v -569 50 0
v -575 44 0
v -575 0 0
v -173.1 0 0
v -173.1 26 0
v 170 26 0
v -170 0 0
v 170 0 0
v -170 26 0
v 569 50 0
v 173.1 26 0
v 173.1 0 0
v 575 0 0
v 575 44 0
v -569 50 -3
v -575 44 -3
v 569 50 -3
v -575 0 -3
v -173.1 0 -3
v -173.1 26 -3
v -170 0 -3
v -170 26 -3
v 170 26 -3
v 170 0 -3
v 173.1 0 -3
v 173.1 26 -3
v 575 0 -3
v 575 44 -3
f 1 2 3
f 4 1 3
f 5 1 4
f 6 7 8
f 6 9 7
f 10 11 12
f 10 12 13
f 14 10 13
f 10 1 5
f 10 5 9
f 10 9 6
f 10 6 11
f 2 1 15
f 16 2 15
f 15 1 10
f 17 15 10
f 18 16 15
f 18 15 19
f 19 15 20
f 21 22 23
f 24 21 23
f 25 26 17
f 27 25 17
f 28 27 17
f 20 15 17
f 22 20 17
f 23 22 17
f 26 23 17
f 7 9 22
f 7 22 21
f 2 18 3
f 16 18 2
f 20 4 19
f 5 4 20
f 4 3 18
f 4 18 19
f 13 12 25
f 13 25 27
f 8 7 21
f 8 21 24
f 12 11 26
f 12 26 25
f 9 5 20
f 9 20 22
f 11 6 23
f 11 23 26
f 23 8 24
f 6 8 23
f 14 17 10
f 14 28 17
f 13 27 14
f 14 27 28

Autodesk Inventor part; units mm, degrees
ref_plane "YZ Plane" through (0, 0, 0) normal (1, 0, 0) x (0, 1, 0)
ref_plane "XZ Plane" through (0, 0, 0) normal (0, 1, 0) x (-1, 0, 0)
ref_plane "XY Plane" through (0, 0, 0) normal (0, 0, 1) x (1, 0, 0)
sketch "Sketch1" plane through (0, 0, 0) normal (0, 0, 1) x (1, 0, 0)
  line L0 (-600, 0) -> (600, 0)
  line L1 (-600, 0) -> (-600, 50)
  line L2 (-600, 50) -> (600, 50)
  line L3 (600, 50) -> (600, 0)
  circle A0 centre (-600, 0) radius 25
  circle A1 centre (600, 0) radius 25
  line L4 (600, 0) -> (644.2345, 16.1001)
  line L5 (644.2345, 16.1001) -> (635, 50)
  line L6 (635, 50) -> (600, 50)
  point P0 (0, 0)
  point P1 (0, 0)
  point P2 (-600, 25)
  point P3 (-575, 0)
  point P4 (575, 0)
  point P5 (600, 25)
  point P6 (623.4923, 8.5505)
  dimension "d18" = 50
  dimension "d19" = 1200
  dimension "d25" = 50
  dimension "d26" = 50
  dimension "d39" = 70
  dimension "d40" = 35
extrude "Plate2" add sketch "Sketch1" against normal blind 3 contours L1 A0 L0 | A0 L1 L2 L3 A1 L0 | A1 L3 L0 picked at (-598.1457, 16.4577)
sketch "Sketch3" plane through (0, 0, 0) normal (0, 0, 1) x (1, 0, 0)
  line L0 (-171.55, 0) -> (-171.55, 50) construction
  line L1 (600, 50) -> (-600, 50) construction
  line L2 (-600, 50) -> (-600, 0) projected
  line L3 (-173.1, 26) -> (-170, 26)
  line L4 (-170, 26) -> (-170, 0)
  line L5 (-170, 0) -> (-173.1, 0)
  line L6 (-173.1, 0) -> (-173.1, 26)
  line L7 (-600, 0) -> (600, 0) projected
  line L8 (171.55, 50) -> (171.55, 0) construction
  line L9 (170, 26) -> (173.1, 26)
  line L10 (173.1, 26) -> (173.1, 0)
  line L11 (173.1, 0) -> (170, 0)
  line L12 (170, 0) -> (170, 26)
  line L13 (0, 0) -> (0, 50) construction
  point P0 (0, 0)
  point P1 (170, 0)
  point P2 (173.1, 0)
  dimension "d28" = 3.1
  dimension "d29" = 26
  dimension "d52" = 340
extrude "Extrusion2" cut sketch "Sketch3" against normal through all
sketch "Sketch4" plane through (0, 0, -3) normal (0, 0, -1) x (-1, 0, 0)
  line L0 (170, 0) -> (170, 26) projected
  line L1 (170, 26) -> (173.1, 26) projected
  line L2 (173.1, 26) -> (173.1, 0) projected
  line L3 (600, 0) -> (173.1, 0) projected
  line L4 (600, 50) -> (600, 0) projected
  line L5 (-600, 50) -> (600, 50) projected
  line L6 (-600, 0) -> (-600, 50) projected
  line L7 (-173.1, 0) -> (-600, 0) projected
  line L8 (-173.1, 0) -> (-173.1, 26) projected
  line L9 (-173.1, 26) -> (-170, 26) projected
  line L10 (-170, 26) -> (-170, 0) projected
  line L11 (170, 0) -> (-170, 0) projected
  line L12 (-575, 0) -> (-575, 50)
  line L13 (-600, 50) -> (600, 50) projected
  line L14 (600, 0) -> (173.1, 0) projected
  line L15 (575, 0) -> (575, 50)
  point P0 (0, 0)
  point P1 (-575, 50)
  point P2 (575, 0)
  dimension "d45" = 25
  dimension "d46" = 25
extrude "Extrusion3" cut sketch "Sketch4" against normal through all contours L15 L5 L4 L3 | L7 L6 L5 L12
sketch "Sketch5" plane through (0, 0, 0) normal (0, 0, 1) x (1, 0, 0)
  line L0 (-55.7541, 0.5014) -> (-55.7541, 31.0924) construction
  line L1 (-55.7541, 31.0924) -> (99.4942, 31.0924) construction
  line L2 (99.4942, 31.0924) -> (99.4942, 0.5014) construction
  line L3 (99.4942, 0.5014) -> (-55.7541, 0.5014) construction
  line L4 (575, 50) -> (-575, 50) projected
  line L5 (-575, 50) -> (-575, 0) projected
  point P0 (0, 0)
mark "Mark1"
chamfer "Corner Chamfer1" distance 6 angle 45 2 edges at (-575, 50, -1.5) (575, 50, -1.5)
equation "\"d46\" = d45"
equation "\"d20\" = Thickness"
equation "\"BendReliefWidth\" = Thickness"
equation "\"BendReliefDepth\" = 0.5 * Thickness"
equation "\"CornerReliefSize\" = 4 * Thickness"
equation "\"MinimumRemnant\" = 2 * Thickness"
equation "\"TransitionRadius\" = BendRadius"
equation "\"JacobiRadiusSize\" = BendRadius"
equation "\"GapSize\" = Thickness"
equation "\"Thickness\" = 3"
equation "\"BendRadius\" = 5"
properties part number "MSC 106 RIB CONE" material "Stainless Steel"
